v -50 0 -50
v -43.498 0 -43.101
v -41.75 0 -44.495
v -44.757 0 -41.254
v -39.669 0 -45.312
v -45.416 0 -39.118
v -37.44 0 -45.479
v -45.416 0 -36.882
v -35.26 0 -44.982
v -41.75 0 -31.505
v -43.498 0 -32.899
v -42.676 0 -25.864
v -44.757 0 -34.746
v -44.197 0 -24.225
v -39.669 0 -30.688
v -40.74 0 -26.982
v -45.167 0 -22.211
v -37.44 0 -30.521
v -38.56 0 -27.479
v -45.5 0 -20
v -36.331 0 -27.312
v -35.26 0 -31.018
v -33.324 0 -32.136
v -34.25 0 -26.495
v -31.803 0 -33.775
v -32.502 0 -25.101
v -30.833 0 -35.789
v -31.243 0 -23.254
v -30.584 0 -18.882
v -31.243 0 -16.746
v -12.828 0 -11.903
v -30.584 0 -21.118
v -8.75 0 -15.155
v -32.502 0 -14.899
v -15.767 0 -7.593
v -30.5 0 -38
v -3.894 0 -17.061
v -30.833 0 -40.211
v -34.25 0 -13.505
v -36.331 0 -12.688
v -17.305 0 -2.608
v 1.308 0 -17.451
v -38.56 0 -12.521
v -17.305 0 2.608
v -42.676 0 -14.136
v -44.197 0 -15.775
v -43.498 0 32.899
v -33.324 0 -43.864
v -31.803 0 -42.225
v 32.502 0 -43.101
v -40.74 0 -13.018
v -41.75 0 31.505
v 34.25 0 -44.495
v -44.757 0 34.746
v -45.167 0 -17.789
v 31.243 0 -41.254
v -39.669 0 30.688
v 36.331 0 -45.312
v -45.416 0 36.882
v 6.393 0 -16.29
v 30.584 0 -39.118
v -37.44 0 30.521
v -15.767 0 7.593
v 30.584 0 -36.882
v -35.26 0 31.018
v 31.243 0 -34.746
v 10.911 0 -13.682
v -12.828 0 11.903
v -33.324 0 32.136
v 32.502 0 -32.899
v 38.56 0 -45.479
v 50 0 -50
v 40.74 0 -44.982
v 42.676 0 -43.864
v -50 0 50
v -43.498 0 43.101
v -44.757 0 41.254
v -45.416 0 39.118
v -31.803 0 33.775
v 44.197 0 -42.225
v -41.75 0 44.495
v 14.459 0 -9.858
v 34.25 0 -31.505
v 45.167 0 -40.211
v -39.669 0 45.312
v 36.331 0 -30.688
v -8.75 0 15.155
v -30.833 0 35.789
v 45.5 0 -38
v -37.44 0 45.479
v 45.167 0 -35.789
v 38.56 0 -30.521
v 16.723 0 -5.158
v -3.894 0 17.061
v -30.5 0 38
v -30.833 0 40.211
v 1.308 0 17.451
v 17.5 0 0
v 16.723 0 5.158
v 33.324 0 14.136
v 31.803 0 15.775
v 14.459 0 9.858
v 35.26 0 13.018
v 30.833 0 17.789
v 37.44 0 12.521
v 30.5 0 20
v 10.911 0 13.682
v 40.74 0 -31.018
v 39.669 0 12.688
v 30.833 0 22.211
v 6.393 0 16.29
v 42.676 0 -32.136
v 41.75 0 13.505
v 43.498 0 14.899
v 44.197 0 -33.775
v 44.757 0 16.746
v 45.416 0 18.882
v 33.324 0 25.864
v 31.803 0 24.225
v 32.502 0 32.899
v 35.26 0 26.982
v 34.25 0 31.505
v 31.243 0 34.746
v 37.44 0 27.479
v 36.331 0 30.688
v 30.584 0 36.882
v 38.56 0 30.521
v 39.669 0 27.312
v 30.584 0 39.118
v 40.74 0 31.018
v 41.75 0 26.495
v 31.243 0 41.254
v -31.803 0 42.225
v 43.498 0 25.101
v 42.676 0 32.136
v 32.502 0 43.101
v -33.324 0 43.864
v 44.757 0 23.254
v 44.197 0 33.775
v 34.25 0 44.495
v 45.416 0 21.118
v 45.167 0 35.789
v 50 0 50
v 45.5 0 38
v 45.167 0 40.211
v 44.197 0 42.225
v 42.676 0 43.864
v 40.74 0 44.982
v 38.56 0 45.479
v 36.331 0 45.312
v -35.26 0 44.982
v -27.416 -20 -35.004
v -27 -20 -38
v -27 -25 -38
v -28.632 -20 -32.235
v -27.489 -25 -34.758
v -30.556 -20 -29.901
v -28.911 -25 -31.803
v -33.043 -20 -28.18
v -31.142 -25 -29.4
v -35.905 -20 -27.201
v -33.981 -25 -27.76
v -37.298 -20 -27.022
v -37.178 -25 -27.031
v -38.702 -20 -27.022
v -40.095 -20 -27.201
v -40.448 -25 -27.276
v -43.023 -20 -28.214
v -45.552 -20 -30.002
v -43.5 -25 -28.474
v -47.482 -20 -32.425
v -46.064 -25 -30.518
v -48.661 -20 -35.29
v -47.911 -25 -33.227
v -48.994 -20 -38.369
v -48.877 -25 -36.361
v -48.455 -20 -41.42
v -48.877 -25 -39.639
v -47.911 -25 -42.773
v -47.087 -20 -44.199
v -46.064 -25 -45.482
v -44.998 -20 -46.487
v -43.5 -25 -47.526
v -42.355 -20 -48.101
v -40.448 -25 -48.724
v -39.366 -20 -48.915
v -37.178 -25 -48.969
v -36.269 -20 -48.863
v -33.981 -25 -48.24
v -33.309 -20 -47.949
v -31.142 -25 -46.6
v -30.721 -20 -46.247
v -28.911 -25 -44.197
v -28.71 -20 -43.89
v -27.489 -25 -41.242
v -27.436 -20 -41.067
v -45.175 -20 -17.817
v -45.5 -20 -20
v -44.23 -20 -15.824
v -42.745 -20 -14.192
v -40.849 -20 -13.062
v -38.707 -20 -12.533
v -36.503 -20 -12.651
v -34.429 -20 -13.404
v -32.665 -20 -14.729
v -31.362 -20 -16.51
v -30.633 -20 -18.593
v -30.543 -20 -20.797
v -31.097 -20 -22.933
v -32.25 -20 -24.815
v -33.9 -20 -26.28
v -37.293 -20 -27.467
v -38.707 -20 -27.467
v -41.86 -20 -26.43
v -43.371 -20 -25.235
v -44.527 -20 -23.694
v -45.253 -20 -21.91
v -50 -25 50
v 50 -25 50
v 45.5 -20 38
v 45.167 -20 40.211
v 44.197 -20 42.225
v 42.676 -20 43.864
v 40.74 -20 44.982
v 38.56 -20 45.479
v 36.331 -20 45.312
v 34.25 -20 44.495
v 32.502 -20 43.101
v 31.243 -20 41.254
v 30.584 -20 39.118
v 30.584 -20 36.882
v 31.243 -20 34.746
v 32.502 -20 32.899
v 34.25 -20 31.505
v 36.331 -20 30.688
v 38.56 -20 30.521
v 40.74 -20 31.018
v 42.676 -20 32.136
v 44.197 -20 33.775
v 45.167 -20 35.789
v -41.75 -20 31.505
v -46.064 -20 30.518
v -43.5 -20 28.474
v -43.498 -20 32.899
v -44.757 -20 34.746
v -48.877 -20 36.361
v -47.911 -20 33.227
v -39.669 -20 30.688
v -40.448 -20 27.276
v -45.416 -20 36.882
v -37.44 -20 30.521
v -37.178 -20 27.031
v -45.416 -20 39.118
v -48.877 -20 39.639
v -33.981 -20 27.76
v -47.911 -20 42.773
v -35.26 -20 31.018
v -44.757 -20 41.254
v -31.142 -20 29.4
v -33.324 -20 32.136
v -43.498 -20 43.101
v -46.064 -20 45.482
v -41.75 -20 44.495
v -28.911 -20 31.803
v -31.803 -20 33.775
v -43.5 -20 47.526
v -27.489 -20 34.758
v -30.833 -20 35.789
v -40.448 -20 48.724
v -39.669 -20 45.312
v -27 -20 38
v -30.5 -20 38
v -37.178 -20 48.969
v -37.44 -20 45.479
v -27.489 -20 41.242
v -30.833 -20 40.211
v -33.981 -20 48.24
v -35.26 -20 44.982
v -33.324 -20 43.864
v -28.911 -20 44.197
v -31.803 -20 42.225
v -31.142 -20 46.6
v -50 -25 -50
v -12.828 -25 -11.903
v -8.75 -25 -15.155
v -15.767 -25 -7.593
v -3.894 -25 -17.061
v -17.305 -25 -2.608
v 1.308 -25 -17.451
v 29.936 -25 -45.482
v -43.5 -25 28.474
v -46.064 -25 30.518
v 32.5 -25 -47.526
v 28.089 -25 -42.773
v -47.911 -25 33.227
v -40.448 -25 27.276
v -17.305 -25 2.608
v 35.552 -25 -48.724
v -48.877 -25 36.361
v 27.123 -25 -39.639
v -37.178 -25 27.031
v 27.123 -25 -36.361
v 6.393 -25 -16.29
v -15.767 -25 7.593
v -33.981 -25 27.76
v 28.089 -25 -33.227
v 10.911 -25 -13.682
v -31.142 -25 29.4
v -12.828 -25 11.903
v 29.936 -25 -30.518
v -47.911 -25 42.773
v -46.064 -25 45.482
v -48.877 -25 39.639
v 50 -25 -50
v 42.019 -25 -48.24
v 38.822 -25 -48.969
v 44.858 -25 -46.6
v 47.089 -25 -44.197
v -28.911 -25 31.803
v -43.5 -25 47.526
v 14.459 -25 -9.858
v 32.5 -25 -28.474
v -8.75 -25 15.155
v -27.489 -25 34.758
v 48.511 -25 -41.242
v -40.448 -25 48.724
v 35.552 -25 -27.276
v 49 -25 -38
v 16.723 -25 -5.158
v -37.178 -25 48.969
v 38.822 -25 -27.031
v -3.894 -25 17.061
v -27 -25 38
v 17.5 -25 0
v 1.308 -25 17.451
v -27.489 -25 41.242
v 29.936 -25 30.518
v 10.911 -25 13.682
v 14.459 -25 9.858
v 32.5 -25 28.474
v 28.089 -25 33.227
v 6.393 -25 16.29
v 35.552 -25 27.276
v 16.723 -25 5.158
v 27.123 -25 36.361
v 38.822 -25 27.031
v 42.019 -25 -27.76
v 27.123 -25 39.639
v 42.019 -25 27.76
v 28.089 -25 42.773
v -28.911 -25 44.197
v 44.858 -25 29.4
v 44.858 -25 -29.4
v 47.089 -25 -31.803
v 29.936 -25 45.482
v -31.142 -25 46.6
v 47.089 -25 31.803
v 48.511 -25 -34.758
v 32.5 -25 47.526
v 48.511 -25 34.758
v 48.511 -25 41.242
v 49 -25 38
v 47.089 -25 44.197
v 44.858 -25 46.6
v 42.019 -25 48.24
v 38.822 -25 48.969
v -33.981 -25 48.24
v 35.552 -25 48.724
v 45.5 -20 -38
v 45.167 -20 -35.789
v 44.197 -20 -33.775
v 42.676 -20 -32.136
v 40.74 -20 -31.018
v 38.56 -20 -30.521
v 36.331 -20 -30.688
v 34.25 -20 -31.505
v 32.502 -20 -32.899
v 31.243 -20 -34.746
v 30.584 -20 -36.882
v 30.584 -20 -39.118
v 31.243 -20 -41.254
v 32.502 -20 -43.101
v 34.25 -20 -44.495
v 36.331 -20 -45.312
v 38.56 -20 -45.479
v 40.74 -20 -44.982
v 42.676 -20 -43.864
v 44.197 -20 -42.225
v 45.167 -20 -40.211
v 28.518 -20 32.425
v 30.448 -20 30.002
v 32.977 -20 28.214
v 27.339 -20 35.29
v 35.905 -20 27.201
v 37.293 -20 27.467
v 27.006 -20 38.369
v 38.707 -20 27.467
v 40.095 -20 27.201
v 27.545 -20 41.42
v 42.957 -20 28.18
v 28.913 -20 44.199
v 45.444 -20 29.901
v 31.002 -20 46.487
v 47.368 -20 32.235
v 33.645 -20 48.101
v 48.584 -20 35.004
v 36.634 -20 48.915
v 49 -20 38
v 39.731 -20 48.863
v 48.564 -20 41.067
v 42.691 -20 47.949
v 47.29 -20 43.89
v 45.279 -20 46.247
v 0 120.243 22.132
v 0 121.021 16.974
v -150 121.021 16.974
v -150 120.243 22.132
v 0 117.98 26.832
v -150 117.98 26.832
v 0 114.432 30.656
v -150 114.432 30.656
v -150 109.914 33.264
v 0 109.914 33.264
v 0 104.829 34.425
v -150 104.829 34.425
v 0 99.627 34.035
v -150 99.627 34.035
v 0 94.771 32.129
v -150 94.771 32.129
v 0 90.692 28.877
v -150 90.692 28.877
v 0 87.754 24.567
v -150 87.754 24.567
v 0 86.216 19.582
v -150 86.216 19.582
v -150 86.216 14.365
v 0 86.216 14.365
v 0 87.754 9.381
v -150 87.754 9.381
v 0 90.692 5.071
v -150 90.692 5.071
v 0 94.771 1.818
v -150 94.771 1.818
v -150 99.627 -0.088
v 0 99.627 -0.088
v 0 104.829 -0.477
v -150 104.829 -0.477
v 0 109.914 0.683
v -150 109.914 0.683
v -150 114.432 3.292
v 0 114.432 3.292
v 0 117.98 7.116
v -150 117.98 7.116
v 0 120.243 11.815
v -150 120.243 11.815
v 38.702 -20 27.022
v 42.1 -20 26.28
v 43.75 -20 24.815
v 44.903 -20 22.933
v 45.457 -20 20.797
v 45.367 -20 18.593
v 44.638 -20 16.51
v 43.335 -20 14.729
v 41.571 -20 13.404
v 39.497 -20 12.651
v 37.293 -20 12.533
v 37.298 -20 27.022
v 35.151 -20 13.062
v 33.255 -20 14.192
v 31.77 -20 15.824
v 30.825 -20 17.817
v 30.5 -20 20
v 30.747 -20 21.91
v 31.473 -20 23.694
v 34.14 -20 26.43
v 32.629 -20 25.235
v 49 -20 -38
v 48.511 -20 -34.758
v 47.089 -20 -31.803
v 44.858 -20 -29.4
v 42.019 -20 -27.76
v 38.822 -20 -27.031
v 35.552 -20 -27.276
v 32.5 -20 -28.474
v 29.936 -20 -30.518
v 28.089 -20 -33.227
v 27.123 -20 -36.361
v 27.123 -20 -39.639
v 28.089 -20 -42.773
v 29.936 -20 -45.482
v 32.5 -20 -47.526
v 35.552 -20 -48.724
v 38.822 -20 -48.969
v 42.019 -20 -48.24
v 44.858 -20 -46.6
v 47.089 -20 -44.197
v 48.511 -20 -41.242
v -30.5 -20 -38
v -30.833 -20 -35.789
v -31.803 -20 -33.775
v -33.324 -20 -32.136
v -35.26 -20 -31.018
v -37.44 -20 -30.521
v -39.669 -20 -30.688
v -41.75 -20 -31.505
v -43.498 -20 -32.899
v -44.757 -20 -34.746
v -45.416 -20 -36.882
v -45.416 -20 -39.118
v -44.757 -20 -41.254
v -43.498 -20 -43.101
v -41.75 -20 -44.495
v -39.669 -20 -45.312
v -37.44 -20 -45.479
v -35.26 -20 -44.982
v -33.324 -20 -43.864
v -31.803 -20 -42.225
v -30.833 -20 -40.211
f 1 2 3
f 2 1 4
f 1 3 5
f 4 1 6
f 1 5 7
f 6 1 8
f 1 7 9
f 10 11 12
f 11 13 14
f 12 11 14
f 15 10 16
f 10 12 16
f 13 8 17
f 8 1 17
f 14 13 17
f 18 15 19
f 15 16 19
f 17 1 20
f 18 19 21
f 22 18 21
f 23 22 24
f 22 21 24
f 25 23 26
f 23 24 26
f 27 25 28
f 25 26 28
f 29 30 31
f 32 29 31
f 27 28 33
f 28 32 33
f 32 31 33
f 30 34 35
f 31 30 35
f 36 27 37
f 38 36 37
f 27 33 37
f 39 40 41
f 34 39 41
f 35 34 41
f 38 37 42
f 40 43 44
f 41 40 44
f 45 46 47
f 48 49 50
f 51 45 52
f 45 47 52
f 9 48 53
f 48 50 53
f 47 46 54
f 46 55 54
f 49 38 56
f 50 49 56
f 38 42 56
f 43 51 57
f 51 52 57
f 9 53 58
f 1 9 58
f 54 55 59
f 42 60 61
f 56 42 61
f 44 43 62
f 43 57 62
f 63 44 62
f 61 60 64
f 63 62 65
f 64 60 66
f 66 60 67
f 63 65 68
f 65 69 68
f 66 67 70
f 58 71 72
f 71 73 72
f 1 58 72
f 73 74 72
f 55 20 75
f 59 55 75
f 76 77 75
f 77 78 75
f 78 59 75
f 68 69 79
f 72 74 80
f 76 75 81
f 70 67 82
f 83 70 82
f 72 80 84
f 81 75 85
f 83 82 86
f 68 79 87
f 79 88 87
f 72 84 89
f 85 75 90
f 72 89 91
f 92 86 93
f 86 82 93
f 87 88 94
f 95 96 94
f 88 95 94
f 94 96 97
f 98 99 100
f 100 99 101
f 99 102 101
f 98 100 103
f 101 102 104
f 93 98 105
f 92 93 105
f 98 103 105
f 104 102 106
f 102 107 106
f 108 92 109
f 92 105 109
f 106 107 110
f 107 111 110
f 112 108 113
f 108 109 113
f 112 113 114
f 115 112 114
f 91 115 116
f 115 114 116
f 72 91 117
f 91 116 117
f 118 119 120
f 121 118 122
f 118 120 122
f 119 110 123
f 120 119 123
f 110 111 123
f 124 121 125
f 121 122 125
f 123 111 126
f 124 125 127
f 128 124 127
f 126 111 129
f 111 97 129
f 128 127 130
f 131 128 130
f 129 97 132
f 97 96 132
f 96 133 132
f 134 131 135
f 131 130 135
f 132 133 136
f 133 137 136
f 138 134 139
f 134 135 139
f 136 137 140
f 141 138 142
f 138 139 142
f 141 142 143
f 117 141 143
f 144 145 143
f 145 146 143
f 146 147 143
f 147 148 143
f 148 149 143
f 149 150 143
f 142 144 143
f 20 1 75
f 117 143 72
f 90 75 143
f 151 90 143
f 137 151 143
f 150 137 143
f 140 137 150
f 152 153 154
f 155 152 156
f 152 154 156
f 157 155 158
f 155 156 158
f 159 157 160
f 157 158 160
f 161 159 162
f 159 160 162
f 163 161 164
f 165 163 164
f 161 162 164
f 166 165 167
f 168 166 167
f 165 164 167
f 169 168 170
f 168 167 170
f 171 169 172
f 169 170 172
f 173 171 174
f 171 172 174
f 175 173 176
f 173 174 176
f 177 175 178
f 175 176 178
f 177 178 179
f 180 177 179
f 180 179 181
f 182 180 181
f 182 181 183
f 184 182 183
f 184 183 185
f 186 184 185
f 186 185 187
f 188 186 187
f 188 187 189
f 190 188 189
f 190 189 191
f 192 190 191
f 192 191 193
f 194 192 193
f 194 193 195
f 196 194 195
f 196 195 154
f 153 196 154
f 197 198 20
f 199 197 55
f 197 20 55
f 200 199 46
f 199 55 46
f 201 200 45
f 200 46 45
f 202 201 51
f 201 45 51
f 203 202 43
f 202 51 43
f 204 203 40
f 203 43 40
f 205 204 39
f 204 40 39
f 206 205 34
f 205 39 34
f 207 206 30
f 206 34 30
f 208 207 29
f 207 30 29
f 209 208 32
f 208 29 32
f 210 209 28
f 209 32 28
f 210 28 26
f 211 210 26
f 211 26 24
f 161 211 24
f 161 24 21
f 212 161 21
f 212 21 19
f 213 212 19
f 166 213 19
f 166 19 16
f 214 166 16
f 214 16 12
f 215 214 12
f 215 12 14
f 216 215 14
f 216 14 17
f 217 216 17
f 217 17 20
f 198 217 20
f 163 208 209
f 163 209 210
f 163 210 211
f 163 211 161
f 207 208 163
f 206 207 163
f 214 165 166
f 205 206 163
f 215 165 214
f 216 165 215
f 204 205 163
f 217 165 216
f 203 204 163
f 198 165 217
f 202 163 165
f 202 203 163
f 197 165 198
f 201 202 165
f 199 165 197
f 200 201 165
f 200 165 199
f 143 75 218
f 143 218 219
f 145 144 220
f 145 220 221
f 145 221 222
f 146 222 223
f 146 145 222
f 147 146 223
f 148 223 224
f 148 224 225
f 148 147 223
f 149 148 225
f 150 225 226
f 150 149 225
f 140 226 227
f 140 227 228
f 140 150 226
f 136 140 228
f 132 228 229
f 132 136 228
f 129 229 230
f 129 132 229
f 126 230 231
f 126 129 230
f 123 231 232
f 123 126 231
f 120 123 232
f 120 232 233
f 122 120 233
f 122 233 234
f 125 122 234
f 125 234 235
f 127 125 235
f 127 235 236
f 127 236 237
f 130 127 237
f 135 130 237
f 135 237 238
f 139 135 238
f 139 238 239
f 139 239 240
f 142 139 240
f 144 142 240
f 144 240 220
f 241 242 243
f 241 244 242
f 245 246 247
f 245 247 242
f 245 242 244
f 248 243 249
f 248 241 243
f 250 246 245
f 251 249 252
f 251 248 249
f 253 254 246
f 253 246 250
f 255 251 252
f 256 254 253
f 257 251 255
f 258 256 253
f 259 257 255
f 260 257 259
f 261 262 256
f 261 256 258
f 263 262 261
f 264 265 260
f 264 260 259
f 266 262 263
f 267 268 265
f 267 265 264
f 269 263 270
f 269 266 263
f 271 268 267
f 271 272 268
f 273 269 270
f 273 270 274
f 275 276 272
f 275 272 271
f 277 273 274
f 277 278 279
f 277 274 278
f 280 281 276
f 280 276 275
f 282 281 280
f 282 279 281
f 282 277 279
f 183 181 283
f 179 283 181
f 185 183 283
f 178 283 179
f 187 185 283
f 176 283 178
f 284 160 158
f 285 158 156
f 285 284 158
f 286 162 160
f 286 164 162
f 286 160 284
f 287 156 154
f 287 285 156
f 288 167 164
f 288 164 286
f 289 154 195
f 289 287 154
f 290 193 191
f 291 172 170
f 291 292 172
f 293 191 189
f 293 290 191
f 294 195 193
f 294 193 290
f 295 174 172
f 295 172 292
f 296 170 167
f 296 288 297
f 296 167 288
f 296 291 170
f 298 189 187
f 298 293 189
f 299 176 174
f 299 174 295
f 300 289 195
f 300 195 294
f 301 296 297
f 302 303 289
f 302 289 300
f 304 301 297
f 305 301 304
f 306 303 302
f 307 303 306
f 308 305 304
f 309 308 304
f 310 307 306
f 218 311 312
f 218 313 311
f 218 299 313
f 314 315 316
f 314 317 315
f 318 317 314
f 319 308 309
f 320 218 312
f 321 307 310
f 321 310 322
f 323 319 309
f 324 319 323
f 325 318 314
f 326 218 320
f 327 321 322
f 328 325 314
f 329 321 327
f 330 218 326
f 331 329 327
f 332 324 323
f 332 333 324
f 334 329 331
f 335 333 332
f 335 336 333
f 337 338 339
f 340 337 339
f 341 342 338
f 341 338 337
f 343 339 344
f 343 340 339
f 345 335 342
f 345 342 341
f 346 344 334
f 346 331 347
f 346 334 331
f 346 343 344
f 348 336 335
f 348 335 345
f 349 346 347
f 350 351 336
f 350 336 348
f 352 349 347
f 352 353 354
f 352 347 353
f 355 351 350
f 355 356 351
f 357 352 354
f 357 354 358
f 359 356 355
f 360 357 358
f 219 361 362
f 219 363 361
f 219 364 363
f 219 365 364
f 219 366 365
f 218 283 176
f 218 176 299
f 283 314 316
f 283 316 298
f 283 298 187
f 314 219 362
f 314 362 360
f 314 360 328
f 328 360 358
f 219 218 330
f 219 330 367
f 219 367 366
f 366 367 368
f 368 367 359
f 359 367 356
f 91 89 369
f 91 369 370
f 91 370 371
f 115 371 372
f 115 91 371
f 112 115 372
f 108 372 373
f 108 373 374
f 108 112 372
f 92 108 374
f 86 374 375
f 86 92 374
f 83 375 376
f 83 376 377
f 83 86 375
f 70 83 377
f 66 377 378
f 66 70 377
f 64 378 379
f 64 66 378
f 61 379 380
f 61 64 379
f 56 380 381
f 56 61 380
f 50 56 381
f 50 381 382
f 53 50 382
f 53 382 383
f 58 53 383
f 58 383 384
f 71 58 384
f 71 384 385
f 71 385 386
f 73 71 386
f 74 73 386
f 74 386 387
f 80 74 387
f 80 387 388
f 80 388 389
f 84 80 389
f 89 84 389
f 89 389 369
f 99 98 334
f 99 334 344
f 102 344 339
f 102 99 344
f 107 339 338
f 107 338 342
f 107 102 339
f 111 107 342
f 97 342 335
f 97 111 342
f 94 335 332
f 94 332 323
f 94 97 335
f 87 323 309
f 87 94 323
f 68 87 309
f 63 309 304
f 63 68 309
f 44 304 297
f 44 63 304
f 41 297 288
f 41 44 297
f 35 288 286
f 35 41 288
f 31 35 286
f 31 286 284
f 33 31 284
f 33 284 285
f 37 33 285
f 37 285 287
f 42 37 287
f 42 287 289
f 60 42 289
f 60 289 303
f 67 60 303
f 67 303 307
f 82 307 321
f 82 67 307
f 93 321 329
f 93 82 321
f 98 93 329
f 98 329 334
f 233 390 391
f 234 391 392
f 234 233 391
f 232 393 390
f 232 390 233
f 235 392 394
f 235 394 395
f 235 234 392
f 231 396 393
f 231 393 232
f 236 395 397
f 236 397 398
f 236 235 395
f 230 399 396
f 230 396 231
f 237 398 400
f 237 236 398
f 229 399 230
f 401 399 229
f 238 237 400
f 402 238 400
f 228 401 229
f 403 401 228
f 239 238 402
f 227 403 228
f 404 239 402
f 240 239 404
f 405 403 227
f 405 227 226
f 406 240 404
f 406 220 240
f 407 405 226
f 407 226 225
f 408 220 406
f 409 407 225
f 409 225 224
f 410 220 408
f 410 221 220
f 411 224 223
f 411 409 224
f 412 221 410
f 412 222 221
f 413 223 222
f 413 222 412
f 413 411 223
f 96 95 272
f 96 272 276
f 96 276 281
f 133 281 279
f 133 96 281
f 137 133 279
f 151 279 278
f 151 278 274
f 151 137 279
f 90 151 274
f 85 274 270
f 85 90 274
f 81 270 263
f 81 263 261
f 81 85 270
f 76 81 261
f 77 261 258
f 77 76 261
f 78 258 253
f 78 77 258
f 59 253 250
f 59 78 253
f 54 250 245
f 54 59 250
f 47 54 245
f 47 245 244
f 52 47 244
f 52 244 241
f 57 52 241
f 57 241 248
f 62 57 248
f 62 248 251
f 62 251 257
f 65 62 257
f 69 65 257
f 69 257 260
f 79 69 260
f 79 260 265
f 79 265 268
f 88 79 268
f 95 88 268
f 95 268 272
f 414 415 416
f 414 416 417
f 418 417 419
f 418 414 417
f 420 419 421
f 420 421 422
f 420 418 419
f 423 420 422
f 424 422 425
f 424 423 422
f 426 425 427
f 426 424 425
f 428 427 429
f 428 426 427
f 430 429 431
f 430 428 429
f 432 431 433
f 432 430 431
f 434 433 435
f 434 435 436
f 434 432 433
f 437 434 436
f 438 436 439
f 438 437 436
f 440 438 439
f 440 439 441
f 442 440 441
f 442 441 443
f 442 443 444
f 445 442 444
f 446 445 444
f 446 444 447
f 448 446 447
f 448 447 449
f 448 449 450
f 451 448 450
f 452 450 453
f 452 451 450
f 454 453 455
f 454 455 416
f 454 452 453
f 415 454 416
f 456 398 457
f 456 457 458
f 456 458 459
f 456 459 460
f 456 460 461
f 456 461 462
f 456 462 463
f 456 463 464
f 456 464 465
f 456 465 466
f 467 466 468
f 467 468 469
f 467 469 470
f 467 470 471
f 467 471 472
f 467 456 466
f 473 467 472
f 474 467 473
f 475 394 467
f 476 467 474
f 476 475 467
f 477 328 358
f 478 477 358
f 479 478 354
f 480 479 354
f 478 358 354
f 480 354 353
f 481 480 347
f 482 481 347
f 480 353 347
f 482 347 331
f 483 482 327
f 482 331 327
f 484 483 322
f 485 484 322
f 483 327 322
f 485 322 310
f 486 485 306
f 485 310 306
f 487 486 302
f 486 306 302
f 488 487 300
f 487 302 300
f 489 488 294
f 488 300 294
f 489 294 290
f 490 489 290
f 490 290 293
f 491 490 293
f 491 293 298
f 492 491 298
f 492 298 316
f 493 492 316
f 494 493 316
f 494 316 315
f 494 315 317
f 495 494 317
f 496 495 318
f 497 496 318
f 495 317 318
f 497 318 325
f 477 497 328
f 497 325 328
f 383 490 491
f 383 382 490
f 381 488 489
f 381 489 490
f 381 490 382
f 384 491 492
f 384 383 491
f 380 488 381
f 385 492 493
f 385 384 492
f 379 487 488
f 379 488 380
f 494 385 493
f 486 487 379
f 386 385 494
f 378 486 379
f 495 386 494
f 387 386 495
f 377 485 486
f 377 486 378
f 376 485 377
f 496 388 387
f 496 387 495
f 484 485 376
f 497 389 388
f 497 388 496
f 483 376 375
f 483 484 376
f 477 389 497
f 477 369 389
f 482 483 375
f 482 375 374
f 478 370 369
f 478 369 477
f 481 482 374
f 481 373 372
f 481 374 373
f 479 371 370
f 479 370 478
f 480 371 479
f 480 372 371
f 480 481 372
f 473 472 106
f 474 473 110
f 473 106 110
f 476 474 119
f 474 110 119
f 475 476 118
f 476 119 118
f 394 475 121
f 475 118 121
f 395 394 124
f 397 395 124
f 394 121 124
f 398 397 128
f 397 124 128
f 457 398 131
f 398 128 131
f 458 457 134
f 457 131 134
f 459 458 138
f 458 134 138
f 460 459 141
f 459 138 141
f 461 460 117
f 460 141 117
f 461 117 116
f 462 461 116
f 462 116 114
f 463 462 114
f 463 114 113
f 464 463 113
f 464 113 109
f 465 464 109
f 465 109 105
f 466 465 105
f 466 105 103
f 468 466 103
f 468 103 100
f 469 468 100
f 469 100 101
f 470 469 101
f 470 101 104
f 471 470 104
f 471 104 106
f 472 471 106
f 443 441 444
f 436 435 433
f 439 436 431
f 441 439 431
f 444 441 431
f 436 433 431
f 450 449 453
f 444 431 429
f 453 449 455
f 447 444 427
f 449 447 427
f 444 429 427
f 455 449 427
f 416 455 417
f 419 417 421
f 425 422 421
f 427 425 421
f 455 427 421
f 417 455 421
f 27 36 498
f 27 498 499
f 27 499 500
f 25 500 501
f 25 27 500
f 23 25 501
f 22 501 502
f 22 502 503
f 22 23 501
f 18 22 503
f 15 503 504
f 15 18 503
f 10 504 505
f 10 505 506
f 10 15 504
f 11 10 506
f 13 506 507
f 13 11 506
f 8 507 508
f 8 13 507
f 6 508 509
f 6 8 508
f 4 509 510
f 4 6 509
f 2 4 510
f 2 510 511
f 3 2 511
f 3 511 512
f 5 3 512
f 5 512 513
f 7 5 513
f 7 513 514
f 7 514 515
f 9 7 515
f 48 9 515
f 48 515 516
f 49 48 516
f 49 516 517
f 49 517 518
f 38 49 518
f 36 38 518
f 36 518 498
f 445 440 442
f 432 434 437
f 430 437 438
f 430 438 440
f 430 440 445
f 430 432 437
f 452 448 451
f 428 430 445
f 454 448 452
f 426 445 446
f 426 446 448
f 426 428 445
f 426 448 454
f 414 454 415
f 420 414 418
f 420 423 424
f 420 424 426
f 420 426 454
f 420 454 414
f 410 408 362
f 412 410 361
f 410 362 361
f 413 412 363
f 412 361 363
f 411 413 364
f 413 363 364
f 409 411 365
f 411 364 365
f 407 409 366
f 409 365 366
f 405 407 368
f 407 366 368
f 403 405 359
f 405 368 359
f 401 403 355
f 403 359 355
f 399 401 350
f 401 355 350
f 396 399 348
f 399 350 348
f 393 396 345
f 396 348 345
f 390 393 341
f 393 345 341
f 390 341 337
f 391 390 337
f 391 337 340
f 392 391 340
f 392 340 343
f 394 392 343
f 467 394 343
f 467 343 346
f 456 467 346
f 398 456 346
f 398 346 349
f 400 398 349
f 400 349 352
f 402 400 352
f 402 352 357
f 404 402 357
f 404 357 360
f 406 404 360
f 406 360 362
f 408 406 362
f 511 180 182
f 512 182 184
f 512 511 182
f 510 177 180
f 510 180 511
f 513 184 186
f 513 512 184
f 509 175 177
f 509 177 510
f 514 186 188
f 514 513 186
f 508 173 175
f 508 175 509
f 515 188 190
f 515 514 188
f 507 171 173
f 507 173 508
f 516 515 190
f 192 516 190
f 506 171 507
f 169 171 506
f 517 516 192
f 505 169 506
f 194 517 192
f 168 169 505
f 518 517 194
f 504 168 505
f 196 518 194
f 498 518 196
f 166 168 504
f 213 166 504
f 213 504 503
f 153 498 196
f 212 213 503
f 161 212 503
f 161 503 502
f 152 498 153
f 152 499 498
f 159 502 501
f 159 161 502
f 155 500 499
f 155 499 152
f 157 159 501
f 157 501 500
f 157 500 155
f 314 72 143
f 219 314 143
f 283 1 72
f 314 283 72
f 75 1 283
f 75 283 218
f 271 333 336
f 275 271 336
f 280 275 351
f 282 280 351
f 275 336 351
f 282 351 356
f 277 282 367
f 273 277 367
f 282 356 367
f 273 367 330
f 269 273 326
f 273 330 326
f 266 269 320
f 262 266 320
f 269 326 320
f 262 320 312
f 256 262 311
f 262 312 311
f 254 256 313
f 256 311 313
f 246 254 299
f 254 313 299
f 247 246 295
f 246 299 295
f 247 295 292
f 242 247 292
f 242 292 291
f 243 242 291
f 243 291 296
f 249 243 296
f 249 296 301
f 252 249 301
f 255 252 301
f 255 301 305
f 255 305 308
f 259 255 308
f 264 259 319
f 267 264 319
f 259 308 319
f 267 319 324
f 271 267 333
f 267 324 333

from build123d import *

# Parameters (mm, degrees)
F0_W     = 100
F0_H     = 100
F0_R     = 7.5
F0_R_2   = 17.5
F1_DEPTH = 25
F2_R     = 17.5
F3_DEPTH = 150
F4_R     = 11
F4_R_2   = 7.5
F5_DEPTH = 5
F6_R     = 7.5
F7_DEPTH = 20


with BuildPart() as f1:
    # F0 (on Front) → F1 (new body)
    with BuildSketch(Plane.XZ):
        Rectangle(F0_W, F0_H)
        with Locations((-38, -38)):
            Circle(F0_R, mode=Mode.SUBTRACT)
        with Locations((38, -38)):
            Circle(F0_R, mode=Mode.SUBTRACT)
        with Locations((-38, 38)):
            Circle(F0_R, mode=Mode.SUBTRACT)
        Circle(F0_R_2, mode=Mode.SUBTRACT)
        with Locations((38, 38)):
            Circle(F0_R, mode=Mode.SUBTRACT)
    extrude(amount=F1_DEPTH)

    # F4 (on face) → F5 (cut)
    with BuildSketch(Plane.XZ.offset(25)):
        with Locations((38, 38)):
            Circle(F4_R)
        with Locations((38, 38)):
            Circle(F4_R_2, mode=Mode.SUBTRACT)
        with Locations((-38, 38)):
            Circle(F4_R)
        with Locations((-38, 38)):
            Circle(F4_R_2, mode=Mode.SUBTRACT)
        with Locations((-38, -38)):
            Circle(F4_R)
        with Locations((-38, -38)):
            Circle(F4_R_2, mode=Mode.SUBTRACT)
        with Locations((38, -38)):
            Circle(F4_R)
        with Locations((38, -38)):
            Circle(F4_R_2, mode=Mode.SUBTRACT)
    extrude(amount=-F5_DEPTH, mode=Mode.SUBTRACT)

    # F6 (on face) → F7 (cut)
    with BuildSketch(Plane(origin=(0, 0, 0), x_dir=(-1, 0, 0), z_dir=(0, 1, 0))):
        with Locations((-38, 20)):
            Circle(F6_R)
        with Locations((38, -20)):
            Circle(F6_R)
    extrude(amount=-F7_DEPTH, mode=Mode.SUBTRACT)


with BuildPart() as f3:
    # F2 (on Right) → F3 (new body)
    with BuildSketch(Plane.YZ):
        with Locations((103.52087, 16.973691)):
            Circle(F2_R)
    extrude(amount=-F3_DEPTH)


solid = Compound([f1.part, f3.part])
